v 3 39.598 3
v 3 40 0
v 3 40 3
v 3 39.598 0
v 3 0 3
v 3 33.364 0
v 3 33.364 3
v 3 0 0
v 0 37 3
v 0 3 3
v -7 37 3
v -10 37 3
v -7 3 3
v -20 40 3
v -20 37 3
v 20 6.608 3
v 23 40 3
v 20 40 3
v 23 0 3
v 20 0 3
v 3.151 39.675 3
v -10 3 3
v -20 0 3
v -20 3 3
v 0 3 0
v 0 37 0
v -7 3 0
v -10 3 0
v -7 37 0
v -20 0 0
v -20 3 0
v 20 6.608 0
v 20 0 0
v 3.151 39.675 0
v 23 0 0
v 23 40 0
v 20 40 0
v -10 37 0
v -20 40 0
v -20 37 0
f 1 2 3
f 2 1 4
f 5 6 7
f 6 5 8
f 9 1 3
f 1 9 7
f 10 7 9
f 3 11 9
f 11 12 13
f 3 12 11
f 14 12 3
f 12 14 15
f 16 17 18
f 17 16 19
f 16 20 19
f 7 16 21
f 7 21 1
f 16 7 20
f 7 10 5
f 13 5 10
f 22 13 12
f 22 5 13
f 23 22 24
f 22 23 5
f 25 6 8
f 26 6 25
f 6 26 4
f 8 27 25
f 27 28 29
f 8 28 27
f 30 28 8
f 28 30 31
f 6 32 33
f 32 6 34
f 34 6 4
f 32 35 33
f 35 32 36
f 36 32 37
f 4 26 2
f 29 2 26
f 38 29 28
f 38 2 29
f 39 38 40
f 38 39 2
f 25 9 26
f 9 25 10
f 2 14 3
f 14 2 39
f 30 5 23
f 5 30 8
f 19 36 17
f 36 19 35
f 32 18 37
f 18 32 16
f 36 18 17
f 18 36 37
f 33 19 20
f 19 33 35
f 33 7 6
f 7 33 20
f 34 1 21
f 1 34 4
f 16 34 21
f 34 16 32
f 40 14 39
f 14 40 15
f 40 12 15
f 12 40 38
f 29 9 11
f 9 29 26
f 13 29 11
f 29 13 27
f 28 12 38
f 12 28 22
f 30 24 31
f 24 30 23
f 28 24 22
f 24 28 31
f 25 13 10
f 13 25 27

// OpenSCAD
//I
 translate([-20,37,0]) cube([20,3,3]);
 translate([-10,0,0]) cube([3,40,3]);
 translate([-20,0,0]) cube([20,3,3]);

//N
union(){
 cube([3,40,3]);
 translate([20,0,0,]) cube([3,40,3]);
 translate([20,0,0]) rotate([0,0,27]) cube([3,43,3]);
}
